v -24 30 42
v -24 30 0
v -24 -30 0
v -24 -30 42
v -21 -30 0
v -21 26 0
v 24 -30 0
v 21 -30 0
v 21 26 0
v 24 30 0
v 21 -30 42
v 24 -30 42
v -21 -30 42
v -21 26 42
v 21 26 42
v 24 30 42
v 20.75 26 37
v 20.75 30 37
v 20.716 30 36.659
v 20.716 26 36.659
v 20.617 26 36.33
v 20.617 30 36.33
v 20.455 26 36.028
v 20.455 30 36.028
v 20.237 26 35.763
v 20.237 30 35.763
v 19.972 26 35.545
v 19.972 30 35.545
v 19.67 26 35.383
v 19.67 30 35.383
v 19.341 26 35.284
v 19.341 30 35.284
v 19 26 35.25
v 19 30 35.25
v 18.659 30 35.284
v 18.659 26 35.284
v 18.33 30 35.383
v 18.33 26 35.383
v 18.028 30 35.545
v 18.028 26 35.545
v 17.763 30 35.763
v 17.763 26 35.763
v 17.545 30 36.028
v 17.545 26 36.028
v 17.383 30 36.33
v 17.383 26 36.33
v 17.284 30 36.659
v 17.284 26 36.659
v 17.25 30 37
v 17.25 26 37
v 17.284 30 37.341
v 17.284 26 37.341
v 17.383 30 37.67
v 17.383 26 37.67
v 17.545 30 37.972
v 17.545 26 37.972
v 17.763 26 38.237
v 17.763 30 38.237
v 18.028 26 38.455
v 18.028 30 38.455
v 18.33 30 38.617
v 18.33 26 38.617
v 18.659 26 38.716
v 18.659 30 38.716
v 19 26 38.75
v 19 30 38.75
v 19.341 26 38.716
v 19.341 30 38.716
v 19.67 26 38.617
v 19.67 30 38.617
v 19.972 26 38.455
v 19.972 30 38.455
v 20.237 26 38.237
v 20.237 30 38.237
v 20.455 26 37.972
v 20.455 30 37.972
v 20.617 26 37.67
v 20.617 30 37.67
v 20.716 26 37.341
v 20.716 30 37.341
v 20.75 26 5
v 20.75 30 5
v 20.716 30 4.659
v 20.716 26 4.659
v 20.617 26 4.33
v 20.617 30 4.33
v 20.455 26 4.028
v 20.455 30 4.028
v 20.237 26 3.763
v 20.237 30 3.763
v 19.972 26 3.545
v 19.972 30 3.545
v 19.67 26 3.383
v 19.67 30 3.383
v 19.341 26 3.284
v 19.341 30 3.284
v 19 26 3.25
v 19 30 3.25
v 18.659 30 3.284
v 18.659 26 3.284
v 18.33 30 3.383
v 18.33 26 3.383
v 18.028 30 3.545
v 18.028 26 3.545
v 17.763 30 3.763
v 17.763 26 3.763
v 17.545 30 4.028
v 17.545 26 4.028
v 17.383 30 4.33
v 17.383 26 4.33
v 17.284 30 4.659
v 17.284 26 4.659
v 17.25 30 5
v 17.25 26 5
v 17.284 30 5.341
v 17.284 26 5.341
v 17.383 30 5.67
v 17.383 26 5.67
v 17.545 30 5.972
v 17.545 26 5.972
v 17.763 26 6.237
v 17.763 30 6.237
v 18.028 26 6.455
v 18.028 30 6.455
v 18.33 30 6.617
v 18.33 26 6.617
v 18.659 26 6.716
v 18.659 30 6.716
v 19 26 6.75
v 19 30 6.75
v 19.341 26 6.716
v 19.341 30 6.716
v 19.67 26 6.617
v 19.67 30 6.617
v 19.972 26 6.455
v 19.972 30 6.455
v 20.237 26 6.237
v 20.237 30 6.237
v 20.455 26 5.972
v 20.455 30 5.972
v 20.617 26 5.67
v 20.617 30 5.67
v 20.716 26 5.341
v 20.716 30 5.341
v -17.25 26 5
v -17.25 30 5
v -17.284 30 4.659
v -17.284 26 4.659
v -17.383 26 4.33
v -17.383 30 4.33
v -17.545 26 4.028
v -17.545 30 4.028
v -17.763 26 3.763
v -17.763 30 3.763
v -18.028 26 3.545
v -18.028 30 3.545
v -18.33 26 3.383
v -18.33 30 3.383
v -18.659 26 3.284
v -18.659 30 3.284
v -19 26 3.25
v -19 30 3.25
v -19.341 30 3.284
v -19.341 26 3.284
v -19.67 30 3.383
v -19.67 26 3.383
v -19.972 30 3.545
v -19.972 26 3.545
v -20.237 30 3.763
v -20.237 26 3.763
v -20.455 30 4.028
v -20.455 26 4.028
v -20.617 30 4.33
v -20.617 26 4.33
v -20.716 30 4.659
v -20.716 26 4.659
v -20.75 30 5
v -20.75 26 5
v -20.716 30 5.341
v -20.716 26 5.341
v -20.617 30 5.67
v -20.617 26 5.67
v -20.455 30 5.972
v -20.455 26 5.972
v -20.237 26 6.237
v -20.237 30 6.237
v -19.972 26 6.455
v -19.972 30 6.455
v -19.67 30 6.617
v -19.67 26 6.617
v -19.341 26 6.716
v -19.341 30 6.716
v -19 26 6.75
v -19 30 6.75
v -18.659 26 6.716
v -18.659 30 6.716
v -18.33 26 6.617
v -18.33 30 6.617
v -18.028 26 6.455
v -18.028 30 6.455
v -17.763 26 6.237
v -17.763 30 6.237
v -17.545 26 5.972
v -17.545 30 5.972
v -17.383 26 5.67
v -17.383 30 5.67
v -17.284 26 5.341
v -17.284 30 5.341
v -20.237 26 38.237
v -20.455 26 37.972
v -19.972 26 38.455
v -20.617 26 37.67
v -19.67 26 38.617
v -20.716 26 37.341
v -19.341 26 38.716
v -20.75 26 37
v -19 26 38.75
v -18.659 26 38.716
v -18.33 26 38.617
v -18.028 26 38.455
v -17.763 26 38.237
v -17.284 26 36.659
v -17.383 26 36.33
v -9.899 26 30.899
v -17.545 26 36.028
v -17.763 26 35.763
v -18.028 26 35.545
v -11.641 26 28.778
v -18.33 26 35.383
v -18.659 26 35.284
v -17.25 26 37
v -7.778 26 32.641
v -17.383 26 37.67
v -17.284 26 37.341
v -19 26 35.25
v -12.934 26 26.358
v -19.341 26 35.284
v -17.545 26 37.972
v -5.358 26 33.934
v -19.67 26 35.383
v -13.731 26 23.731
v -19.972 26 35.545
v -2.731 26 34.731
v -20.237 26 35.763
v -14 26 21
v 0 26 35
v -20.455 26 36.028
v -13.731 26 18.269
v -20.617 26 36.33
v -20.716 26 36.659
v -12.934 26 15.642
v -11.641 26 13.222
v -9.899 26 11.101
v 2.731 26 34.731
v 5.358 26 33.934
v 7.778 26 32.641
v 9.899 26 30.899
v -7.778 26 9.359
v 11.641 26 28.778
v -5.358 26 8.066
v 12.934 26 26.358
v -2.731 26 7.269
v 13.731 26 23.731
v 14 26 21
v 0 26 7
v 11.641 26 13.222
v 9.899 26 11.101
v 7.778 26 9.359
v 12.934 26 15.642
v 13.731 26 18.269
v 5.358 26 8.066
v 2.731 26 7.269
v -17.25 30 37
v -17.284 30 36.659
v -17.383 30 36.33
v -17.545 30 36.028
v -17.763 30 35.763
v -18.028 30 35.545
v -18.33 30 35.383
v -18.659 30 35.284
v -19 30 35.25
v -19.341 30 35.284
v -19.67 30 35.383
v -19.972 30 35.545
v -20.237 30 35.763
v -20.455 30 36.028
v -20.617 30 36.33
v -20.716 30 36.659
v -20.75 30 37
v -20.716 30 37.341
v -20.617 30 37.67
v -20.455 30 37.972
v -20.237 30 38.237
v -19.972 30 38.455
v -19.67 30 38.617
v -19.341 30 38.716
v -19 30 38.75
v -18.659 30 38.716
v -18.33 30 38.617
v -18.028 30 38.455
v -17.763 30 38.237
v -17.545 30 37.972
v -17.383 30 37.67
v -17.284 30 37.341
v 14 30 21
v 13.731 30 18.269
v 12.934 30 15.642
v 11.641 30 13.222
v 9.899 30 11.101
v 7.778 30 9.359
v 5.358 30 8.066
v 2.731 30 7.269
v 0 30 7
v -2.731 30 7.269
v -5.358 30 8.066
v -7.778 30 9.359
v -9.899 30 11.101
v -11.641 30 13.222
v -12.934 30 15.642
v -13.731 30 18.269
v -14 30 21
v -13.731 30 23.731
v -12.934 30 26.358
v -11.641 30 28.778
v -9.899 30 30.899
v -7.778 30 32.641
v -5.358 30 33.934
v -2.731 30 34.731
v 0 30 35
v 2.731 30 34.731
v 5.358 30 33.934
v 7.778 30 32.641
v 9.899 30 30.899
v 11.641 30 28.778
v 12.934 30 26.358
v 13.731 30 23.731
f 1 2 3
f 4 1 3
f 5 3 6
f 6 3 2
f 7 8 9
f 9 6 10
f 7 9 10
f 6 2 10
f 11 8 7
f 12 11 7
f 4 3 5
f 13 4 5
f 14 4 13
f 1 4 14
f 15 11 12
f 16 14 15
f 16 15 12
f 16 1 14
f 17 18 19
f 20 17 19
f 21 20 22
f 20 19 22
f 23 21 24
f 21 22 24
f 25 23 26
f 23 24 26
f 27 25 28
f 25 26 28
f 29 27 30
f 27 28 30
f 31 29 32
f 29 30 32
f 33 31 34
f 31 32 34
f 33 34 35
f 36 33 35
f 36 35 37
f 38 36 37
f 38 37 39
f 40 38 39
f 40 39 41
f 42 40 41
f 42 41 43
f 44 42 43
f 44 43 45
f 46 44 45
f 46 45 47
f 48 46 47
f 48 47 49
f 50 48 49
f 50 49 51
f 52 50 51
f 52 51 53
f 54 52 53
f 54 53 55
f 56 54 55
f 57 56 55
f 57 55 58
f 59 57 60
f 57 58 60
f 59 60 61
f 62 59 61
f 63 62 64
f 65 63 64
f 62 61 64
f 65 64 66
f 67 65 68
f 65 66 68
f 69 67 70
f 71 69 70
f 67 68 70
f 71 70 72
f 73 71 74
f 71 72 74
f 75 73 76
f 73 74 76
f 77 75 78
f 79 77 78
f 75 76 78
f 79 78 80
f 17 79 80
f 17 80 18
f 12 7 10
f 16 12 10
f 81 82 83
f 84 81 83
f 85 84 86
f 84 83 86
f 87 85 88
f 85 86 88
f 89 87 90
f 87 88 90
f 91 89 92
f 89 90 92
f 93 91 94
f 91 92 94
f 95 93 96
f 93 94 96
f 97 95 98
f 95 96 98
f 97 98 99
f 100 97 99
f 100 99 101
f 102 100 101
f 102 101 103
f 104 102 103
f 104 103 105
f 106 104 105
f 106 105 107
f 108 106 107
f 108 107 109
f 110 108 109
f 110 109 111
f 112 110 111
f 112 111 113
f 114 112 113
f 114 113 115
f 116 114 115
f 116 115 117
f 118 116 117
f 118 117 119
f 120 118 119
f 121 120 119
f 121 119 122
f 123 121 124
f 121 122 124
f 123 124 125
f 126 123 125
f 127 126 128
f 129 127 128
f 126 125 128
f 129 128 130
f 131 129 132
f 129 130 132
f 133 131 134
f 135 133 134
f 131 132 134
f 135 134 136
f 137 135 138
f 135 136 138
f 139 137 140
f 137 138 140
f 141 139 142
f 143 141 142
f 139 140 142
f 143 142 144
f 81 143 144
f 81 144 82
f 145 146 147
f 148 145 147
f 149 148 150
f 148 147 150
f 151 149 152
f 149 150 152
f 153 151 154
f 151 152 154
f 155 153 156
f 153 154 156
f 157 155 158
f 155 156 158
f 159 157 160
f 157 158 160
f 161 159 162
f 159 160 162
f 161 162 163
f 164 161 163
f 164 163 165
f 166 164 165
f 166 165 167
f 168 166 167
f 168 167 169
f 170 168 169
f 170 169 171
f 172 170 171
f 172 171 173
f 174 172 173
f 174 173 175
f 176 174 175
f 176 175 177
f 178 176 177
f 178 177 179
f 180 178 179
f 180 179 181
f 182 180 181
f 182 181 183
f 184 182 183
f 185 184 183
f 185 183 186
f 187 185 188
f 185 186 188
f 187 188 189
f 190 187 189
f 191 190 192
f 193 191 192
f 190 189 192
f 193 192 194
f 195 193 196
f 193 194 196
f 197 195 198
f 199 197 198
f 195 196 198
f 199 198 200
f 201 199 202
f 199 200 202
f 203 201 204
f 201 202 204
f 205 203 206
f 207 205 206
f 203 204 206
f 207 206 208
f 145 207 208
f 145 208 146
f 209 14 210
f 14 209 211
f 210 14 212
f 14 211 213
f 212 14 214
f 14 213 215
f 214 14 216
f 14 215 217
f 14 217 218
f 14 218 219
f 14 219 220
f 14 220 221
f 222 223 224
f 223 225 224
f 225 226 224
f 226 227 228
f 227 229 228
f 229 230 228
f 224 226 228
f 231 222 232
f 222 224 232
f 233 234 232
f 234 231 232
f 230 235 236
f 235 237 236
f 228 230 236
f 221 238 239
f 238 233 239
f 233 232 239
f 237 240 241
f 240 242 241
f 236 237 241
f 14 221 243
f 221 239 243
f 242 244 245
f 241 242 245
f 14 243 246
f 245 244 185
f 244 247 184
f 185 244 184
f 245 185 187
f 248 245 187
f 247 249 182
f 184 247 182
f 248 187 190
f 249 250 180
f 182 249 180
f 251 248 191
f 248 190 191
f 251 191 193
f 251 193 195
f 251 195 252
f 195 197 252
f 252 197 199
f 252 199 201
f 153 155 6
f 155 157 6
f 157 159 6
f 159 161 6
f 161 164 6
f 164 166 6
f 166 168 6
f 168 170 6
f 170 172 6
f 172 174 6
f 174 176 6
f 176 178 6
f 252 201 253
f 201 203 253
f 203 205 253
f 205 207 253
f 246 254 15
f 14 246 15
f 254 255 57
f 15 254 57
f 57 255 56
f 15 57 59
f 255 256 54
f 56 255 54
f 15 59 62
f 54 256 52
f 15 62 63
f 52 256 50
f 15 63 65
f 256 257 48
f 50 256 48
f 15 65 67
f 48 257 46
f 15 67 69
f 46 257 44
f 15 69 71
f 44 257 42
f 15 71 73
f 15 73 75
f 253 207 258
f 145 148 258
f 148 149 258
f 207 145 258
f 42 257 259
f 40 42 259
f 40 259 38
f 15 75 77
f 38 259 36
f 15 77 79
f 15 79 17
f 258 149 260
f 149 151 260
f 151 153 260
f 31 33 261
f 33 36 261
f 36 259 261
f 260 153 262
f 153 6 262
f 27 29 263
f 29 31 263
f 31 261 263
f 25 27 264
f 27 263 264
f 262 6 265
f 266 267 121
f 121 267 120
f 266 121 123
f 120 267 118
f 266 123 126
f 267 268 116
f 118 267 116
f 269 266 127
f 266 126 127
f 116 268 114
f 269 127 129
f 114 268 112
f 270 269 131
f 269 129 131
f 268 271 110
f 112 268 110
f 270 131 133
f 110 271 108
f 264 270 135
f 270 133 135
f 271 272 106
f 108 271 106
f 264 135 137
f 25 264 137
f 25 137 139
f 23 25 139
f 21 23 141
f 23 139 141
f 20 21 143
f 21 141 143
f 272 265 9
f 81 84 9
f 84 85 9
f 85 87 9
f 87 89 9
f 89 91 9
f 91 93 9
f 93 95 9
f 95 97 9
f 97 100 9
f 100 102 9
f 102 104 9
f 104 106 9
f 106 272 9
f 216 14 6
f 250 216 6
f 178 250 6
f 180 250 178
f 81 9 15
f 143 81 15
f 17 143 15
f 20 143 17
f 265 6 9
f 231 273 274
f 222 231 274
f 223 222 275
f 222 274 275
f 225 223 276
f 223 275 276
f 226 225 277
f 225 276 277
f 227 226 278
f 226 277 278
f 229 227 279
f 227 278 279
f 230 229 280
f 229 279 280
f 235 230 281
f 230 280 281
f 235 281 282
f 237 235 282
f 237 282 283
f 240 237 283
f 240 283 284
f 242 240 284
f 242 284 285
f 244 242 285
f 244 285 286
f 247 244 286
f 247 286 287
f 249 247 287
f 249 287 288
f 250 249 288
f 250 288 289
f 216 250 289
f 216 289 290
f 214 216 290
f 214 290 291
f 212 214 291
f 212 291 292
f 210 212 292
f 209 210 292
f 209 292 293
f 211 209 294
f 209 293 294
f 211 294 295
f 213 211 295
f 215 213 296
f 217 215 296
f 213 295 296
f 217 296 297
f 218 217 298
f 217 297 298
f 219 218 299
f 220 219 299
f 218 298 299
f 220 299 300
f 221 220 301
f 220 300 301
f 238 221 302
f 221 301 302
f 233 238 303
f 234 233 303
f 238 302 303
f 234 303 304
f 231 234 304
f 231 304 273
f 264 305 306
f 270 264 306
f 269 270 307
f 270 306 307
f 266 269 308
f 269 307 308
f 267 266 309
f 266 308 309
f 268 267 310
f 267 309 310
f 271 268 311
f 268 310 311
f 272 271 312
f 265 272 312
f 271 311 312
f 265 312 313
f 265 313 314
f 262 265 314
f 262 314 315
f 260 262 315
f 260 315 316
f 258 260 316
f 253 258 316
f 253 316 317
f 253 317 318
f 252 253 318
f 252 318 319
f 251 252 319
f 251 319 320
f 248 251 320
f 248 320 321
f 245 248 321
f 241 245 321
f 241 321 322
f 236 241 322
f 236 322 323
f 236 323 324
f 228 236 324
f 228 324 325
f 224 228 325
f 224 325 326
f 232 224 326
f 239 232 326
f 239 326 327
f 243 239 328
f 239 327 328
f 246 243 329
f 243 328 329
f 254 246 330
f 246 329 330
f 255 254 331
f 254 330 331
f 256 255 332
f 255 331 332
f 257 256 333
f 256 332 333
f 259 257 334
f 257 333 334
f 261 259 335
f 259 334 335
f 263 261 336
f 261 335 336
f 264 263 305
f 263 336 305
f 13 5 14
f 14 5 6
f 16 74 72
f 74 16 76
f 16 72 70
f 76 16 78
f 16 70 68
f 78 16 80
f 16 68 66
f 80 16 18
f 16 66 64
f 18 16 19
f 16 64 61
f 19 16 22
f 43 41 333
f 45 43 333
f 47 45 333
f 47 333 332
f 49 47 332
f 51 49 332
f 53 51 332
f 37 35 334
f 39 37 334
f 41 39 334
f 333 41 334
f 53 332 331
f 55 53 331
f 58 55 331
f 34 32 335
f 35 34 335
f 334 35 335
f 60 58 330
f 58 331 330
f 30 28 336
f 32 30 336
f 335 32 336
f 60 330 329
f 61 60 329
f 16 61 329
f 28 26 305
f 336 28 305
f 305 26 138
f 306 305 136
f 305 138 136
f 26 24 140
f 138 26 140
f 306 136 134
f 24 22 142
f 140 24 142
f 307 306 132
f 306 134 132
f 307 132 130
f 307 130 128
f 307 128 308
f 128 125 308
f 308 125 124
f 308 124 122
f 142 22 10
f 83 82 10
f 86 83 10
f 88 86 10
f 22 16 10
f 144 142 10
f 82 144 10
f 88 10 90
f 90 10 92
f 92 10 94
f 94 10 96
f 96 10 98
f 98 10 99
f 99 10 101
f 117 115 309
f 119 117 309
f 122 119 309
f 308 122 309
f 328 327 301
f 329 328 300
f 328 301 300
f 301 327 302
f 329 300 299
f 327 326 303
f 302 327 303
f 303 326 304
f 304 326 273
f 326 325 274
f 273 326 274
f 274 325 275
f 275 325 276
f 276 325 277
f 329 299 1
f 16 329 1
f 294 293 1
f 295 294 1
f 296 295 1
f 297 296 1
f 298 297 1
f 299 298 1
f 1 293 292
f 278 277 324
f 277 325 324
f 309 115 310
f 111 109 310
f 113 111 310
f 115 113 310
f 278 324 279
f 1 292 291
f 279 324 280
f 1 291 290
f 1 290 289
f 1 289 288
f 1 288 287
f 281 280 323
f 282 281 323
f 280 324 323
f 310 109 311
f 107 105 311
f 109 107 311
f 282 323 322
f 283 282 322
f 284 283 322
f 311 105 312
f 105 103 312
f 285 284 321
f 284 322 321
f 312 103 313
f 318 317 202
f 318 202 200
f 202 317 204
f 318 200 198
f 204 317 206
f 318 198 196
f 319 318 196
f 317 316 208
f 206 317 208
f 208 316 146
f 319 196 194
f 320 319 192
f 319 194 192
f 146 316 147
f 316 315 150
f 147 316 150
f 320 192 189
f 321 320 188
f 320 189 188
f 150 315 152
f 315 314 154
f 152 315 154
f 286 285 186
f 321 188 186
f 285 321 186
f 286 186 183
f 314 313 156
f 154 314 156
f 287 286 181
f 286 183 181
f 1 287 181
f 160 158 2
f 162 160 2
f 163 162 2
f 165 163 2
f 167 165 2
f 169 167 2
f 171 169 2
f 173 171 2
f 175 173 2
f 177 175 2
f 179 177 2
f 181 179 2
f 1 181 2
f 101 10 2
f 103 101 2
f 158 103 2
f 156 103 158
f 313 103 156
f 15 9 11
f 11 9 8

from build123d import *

# Parameters (mm, degrees)
BOSS_EXTRUDE1_DEPTH = 42
SKETCH2_R           = 1.75
SKETCH2_R_2         = 14
CUT_EXTRUDE1_DEPTH  = 61


with BuildPart() as part:
    # Sketch1 → Boss-Extrude1 (new body)
    with BuildSketch(Plane.XY):
        Polygon((-21, -30), (-21, 26), (21, 26), (21, -30), (24, -30), (24, 30), (-24, 30), (-24, -30), align=None)
    extrude(amount=BOSS_EXTRUDE1_DEPTH)

    # Sketch2 → Cut-Extrude1 (cut, through all)
    with BuildSketch(Plane(origin=(0, 30, 0), x_dir=(1, 0, 0), z_dir=(0, 1, 0))):
        with Locations((19, -37)):
            Circle(SKETCH2_R)
        with Locations((19, -5)):
            Circle(SKETCH2_R)
        with Locations((-19, -37)):
            Circle(SKETCH2_R)
        with Locations((-19, -5)):
            Circle(SKETCH2_R)
        with Locations((0, -21)):
            Circle(SKETCH2_R_2)
    extrude(amount=-CUT_EXTRUDE1_DEPTH, mode=Mode.SUBTRACT)


solid = part.part
